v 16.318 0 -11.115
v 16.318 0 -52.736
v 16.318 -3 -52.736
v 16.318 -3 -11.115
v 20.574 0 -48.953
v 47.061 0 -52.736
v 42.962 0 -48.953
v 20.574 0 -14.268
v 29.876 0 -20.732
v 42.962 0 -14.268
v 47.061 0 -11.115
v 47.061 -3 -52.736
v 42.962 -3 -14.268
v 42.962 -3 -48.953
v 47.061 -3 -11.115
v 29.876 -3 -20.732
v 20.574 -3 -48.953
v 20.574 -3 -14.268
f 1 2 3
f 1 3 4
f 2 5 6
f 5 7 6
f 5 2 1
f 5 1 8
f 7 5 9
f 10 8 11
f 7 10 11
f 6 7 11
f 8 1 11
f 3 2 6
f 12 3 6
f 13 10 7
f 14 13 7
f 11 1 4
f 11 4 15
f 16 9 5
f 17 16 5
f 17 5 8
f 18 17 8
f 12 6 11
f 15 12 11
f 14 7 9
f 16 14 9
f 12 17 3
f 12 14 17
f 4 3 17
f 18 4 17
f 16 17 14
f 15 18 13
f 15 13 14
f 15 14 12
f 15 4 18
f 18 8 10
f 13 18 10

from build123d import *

# Parameters (mm, degrees)
F0_W     = 30.743243
F0_H     = 41.621625
F1_DEPTH = 3


with BuildPart() as f1:
    # F0 (on Front) → F1 (new body)
    with BuildSketch(Plane.XZ):
        with Locations((31.689193, -31.925679)):
            Rectangle(F0_W, F0_H)
        Polygon((20.574326, -48.952702), (20.574326, -14.268018), (42.961713, -14.268018), (42.961713, -48.952702), (29.87613, -20.731982), align=None, mode=Mode.SUBTRACT)
    extrude(amount=F1_DEPTH)


solid = f1.part
